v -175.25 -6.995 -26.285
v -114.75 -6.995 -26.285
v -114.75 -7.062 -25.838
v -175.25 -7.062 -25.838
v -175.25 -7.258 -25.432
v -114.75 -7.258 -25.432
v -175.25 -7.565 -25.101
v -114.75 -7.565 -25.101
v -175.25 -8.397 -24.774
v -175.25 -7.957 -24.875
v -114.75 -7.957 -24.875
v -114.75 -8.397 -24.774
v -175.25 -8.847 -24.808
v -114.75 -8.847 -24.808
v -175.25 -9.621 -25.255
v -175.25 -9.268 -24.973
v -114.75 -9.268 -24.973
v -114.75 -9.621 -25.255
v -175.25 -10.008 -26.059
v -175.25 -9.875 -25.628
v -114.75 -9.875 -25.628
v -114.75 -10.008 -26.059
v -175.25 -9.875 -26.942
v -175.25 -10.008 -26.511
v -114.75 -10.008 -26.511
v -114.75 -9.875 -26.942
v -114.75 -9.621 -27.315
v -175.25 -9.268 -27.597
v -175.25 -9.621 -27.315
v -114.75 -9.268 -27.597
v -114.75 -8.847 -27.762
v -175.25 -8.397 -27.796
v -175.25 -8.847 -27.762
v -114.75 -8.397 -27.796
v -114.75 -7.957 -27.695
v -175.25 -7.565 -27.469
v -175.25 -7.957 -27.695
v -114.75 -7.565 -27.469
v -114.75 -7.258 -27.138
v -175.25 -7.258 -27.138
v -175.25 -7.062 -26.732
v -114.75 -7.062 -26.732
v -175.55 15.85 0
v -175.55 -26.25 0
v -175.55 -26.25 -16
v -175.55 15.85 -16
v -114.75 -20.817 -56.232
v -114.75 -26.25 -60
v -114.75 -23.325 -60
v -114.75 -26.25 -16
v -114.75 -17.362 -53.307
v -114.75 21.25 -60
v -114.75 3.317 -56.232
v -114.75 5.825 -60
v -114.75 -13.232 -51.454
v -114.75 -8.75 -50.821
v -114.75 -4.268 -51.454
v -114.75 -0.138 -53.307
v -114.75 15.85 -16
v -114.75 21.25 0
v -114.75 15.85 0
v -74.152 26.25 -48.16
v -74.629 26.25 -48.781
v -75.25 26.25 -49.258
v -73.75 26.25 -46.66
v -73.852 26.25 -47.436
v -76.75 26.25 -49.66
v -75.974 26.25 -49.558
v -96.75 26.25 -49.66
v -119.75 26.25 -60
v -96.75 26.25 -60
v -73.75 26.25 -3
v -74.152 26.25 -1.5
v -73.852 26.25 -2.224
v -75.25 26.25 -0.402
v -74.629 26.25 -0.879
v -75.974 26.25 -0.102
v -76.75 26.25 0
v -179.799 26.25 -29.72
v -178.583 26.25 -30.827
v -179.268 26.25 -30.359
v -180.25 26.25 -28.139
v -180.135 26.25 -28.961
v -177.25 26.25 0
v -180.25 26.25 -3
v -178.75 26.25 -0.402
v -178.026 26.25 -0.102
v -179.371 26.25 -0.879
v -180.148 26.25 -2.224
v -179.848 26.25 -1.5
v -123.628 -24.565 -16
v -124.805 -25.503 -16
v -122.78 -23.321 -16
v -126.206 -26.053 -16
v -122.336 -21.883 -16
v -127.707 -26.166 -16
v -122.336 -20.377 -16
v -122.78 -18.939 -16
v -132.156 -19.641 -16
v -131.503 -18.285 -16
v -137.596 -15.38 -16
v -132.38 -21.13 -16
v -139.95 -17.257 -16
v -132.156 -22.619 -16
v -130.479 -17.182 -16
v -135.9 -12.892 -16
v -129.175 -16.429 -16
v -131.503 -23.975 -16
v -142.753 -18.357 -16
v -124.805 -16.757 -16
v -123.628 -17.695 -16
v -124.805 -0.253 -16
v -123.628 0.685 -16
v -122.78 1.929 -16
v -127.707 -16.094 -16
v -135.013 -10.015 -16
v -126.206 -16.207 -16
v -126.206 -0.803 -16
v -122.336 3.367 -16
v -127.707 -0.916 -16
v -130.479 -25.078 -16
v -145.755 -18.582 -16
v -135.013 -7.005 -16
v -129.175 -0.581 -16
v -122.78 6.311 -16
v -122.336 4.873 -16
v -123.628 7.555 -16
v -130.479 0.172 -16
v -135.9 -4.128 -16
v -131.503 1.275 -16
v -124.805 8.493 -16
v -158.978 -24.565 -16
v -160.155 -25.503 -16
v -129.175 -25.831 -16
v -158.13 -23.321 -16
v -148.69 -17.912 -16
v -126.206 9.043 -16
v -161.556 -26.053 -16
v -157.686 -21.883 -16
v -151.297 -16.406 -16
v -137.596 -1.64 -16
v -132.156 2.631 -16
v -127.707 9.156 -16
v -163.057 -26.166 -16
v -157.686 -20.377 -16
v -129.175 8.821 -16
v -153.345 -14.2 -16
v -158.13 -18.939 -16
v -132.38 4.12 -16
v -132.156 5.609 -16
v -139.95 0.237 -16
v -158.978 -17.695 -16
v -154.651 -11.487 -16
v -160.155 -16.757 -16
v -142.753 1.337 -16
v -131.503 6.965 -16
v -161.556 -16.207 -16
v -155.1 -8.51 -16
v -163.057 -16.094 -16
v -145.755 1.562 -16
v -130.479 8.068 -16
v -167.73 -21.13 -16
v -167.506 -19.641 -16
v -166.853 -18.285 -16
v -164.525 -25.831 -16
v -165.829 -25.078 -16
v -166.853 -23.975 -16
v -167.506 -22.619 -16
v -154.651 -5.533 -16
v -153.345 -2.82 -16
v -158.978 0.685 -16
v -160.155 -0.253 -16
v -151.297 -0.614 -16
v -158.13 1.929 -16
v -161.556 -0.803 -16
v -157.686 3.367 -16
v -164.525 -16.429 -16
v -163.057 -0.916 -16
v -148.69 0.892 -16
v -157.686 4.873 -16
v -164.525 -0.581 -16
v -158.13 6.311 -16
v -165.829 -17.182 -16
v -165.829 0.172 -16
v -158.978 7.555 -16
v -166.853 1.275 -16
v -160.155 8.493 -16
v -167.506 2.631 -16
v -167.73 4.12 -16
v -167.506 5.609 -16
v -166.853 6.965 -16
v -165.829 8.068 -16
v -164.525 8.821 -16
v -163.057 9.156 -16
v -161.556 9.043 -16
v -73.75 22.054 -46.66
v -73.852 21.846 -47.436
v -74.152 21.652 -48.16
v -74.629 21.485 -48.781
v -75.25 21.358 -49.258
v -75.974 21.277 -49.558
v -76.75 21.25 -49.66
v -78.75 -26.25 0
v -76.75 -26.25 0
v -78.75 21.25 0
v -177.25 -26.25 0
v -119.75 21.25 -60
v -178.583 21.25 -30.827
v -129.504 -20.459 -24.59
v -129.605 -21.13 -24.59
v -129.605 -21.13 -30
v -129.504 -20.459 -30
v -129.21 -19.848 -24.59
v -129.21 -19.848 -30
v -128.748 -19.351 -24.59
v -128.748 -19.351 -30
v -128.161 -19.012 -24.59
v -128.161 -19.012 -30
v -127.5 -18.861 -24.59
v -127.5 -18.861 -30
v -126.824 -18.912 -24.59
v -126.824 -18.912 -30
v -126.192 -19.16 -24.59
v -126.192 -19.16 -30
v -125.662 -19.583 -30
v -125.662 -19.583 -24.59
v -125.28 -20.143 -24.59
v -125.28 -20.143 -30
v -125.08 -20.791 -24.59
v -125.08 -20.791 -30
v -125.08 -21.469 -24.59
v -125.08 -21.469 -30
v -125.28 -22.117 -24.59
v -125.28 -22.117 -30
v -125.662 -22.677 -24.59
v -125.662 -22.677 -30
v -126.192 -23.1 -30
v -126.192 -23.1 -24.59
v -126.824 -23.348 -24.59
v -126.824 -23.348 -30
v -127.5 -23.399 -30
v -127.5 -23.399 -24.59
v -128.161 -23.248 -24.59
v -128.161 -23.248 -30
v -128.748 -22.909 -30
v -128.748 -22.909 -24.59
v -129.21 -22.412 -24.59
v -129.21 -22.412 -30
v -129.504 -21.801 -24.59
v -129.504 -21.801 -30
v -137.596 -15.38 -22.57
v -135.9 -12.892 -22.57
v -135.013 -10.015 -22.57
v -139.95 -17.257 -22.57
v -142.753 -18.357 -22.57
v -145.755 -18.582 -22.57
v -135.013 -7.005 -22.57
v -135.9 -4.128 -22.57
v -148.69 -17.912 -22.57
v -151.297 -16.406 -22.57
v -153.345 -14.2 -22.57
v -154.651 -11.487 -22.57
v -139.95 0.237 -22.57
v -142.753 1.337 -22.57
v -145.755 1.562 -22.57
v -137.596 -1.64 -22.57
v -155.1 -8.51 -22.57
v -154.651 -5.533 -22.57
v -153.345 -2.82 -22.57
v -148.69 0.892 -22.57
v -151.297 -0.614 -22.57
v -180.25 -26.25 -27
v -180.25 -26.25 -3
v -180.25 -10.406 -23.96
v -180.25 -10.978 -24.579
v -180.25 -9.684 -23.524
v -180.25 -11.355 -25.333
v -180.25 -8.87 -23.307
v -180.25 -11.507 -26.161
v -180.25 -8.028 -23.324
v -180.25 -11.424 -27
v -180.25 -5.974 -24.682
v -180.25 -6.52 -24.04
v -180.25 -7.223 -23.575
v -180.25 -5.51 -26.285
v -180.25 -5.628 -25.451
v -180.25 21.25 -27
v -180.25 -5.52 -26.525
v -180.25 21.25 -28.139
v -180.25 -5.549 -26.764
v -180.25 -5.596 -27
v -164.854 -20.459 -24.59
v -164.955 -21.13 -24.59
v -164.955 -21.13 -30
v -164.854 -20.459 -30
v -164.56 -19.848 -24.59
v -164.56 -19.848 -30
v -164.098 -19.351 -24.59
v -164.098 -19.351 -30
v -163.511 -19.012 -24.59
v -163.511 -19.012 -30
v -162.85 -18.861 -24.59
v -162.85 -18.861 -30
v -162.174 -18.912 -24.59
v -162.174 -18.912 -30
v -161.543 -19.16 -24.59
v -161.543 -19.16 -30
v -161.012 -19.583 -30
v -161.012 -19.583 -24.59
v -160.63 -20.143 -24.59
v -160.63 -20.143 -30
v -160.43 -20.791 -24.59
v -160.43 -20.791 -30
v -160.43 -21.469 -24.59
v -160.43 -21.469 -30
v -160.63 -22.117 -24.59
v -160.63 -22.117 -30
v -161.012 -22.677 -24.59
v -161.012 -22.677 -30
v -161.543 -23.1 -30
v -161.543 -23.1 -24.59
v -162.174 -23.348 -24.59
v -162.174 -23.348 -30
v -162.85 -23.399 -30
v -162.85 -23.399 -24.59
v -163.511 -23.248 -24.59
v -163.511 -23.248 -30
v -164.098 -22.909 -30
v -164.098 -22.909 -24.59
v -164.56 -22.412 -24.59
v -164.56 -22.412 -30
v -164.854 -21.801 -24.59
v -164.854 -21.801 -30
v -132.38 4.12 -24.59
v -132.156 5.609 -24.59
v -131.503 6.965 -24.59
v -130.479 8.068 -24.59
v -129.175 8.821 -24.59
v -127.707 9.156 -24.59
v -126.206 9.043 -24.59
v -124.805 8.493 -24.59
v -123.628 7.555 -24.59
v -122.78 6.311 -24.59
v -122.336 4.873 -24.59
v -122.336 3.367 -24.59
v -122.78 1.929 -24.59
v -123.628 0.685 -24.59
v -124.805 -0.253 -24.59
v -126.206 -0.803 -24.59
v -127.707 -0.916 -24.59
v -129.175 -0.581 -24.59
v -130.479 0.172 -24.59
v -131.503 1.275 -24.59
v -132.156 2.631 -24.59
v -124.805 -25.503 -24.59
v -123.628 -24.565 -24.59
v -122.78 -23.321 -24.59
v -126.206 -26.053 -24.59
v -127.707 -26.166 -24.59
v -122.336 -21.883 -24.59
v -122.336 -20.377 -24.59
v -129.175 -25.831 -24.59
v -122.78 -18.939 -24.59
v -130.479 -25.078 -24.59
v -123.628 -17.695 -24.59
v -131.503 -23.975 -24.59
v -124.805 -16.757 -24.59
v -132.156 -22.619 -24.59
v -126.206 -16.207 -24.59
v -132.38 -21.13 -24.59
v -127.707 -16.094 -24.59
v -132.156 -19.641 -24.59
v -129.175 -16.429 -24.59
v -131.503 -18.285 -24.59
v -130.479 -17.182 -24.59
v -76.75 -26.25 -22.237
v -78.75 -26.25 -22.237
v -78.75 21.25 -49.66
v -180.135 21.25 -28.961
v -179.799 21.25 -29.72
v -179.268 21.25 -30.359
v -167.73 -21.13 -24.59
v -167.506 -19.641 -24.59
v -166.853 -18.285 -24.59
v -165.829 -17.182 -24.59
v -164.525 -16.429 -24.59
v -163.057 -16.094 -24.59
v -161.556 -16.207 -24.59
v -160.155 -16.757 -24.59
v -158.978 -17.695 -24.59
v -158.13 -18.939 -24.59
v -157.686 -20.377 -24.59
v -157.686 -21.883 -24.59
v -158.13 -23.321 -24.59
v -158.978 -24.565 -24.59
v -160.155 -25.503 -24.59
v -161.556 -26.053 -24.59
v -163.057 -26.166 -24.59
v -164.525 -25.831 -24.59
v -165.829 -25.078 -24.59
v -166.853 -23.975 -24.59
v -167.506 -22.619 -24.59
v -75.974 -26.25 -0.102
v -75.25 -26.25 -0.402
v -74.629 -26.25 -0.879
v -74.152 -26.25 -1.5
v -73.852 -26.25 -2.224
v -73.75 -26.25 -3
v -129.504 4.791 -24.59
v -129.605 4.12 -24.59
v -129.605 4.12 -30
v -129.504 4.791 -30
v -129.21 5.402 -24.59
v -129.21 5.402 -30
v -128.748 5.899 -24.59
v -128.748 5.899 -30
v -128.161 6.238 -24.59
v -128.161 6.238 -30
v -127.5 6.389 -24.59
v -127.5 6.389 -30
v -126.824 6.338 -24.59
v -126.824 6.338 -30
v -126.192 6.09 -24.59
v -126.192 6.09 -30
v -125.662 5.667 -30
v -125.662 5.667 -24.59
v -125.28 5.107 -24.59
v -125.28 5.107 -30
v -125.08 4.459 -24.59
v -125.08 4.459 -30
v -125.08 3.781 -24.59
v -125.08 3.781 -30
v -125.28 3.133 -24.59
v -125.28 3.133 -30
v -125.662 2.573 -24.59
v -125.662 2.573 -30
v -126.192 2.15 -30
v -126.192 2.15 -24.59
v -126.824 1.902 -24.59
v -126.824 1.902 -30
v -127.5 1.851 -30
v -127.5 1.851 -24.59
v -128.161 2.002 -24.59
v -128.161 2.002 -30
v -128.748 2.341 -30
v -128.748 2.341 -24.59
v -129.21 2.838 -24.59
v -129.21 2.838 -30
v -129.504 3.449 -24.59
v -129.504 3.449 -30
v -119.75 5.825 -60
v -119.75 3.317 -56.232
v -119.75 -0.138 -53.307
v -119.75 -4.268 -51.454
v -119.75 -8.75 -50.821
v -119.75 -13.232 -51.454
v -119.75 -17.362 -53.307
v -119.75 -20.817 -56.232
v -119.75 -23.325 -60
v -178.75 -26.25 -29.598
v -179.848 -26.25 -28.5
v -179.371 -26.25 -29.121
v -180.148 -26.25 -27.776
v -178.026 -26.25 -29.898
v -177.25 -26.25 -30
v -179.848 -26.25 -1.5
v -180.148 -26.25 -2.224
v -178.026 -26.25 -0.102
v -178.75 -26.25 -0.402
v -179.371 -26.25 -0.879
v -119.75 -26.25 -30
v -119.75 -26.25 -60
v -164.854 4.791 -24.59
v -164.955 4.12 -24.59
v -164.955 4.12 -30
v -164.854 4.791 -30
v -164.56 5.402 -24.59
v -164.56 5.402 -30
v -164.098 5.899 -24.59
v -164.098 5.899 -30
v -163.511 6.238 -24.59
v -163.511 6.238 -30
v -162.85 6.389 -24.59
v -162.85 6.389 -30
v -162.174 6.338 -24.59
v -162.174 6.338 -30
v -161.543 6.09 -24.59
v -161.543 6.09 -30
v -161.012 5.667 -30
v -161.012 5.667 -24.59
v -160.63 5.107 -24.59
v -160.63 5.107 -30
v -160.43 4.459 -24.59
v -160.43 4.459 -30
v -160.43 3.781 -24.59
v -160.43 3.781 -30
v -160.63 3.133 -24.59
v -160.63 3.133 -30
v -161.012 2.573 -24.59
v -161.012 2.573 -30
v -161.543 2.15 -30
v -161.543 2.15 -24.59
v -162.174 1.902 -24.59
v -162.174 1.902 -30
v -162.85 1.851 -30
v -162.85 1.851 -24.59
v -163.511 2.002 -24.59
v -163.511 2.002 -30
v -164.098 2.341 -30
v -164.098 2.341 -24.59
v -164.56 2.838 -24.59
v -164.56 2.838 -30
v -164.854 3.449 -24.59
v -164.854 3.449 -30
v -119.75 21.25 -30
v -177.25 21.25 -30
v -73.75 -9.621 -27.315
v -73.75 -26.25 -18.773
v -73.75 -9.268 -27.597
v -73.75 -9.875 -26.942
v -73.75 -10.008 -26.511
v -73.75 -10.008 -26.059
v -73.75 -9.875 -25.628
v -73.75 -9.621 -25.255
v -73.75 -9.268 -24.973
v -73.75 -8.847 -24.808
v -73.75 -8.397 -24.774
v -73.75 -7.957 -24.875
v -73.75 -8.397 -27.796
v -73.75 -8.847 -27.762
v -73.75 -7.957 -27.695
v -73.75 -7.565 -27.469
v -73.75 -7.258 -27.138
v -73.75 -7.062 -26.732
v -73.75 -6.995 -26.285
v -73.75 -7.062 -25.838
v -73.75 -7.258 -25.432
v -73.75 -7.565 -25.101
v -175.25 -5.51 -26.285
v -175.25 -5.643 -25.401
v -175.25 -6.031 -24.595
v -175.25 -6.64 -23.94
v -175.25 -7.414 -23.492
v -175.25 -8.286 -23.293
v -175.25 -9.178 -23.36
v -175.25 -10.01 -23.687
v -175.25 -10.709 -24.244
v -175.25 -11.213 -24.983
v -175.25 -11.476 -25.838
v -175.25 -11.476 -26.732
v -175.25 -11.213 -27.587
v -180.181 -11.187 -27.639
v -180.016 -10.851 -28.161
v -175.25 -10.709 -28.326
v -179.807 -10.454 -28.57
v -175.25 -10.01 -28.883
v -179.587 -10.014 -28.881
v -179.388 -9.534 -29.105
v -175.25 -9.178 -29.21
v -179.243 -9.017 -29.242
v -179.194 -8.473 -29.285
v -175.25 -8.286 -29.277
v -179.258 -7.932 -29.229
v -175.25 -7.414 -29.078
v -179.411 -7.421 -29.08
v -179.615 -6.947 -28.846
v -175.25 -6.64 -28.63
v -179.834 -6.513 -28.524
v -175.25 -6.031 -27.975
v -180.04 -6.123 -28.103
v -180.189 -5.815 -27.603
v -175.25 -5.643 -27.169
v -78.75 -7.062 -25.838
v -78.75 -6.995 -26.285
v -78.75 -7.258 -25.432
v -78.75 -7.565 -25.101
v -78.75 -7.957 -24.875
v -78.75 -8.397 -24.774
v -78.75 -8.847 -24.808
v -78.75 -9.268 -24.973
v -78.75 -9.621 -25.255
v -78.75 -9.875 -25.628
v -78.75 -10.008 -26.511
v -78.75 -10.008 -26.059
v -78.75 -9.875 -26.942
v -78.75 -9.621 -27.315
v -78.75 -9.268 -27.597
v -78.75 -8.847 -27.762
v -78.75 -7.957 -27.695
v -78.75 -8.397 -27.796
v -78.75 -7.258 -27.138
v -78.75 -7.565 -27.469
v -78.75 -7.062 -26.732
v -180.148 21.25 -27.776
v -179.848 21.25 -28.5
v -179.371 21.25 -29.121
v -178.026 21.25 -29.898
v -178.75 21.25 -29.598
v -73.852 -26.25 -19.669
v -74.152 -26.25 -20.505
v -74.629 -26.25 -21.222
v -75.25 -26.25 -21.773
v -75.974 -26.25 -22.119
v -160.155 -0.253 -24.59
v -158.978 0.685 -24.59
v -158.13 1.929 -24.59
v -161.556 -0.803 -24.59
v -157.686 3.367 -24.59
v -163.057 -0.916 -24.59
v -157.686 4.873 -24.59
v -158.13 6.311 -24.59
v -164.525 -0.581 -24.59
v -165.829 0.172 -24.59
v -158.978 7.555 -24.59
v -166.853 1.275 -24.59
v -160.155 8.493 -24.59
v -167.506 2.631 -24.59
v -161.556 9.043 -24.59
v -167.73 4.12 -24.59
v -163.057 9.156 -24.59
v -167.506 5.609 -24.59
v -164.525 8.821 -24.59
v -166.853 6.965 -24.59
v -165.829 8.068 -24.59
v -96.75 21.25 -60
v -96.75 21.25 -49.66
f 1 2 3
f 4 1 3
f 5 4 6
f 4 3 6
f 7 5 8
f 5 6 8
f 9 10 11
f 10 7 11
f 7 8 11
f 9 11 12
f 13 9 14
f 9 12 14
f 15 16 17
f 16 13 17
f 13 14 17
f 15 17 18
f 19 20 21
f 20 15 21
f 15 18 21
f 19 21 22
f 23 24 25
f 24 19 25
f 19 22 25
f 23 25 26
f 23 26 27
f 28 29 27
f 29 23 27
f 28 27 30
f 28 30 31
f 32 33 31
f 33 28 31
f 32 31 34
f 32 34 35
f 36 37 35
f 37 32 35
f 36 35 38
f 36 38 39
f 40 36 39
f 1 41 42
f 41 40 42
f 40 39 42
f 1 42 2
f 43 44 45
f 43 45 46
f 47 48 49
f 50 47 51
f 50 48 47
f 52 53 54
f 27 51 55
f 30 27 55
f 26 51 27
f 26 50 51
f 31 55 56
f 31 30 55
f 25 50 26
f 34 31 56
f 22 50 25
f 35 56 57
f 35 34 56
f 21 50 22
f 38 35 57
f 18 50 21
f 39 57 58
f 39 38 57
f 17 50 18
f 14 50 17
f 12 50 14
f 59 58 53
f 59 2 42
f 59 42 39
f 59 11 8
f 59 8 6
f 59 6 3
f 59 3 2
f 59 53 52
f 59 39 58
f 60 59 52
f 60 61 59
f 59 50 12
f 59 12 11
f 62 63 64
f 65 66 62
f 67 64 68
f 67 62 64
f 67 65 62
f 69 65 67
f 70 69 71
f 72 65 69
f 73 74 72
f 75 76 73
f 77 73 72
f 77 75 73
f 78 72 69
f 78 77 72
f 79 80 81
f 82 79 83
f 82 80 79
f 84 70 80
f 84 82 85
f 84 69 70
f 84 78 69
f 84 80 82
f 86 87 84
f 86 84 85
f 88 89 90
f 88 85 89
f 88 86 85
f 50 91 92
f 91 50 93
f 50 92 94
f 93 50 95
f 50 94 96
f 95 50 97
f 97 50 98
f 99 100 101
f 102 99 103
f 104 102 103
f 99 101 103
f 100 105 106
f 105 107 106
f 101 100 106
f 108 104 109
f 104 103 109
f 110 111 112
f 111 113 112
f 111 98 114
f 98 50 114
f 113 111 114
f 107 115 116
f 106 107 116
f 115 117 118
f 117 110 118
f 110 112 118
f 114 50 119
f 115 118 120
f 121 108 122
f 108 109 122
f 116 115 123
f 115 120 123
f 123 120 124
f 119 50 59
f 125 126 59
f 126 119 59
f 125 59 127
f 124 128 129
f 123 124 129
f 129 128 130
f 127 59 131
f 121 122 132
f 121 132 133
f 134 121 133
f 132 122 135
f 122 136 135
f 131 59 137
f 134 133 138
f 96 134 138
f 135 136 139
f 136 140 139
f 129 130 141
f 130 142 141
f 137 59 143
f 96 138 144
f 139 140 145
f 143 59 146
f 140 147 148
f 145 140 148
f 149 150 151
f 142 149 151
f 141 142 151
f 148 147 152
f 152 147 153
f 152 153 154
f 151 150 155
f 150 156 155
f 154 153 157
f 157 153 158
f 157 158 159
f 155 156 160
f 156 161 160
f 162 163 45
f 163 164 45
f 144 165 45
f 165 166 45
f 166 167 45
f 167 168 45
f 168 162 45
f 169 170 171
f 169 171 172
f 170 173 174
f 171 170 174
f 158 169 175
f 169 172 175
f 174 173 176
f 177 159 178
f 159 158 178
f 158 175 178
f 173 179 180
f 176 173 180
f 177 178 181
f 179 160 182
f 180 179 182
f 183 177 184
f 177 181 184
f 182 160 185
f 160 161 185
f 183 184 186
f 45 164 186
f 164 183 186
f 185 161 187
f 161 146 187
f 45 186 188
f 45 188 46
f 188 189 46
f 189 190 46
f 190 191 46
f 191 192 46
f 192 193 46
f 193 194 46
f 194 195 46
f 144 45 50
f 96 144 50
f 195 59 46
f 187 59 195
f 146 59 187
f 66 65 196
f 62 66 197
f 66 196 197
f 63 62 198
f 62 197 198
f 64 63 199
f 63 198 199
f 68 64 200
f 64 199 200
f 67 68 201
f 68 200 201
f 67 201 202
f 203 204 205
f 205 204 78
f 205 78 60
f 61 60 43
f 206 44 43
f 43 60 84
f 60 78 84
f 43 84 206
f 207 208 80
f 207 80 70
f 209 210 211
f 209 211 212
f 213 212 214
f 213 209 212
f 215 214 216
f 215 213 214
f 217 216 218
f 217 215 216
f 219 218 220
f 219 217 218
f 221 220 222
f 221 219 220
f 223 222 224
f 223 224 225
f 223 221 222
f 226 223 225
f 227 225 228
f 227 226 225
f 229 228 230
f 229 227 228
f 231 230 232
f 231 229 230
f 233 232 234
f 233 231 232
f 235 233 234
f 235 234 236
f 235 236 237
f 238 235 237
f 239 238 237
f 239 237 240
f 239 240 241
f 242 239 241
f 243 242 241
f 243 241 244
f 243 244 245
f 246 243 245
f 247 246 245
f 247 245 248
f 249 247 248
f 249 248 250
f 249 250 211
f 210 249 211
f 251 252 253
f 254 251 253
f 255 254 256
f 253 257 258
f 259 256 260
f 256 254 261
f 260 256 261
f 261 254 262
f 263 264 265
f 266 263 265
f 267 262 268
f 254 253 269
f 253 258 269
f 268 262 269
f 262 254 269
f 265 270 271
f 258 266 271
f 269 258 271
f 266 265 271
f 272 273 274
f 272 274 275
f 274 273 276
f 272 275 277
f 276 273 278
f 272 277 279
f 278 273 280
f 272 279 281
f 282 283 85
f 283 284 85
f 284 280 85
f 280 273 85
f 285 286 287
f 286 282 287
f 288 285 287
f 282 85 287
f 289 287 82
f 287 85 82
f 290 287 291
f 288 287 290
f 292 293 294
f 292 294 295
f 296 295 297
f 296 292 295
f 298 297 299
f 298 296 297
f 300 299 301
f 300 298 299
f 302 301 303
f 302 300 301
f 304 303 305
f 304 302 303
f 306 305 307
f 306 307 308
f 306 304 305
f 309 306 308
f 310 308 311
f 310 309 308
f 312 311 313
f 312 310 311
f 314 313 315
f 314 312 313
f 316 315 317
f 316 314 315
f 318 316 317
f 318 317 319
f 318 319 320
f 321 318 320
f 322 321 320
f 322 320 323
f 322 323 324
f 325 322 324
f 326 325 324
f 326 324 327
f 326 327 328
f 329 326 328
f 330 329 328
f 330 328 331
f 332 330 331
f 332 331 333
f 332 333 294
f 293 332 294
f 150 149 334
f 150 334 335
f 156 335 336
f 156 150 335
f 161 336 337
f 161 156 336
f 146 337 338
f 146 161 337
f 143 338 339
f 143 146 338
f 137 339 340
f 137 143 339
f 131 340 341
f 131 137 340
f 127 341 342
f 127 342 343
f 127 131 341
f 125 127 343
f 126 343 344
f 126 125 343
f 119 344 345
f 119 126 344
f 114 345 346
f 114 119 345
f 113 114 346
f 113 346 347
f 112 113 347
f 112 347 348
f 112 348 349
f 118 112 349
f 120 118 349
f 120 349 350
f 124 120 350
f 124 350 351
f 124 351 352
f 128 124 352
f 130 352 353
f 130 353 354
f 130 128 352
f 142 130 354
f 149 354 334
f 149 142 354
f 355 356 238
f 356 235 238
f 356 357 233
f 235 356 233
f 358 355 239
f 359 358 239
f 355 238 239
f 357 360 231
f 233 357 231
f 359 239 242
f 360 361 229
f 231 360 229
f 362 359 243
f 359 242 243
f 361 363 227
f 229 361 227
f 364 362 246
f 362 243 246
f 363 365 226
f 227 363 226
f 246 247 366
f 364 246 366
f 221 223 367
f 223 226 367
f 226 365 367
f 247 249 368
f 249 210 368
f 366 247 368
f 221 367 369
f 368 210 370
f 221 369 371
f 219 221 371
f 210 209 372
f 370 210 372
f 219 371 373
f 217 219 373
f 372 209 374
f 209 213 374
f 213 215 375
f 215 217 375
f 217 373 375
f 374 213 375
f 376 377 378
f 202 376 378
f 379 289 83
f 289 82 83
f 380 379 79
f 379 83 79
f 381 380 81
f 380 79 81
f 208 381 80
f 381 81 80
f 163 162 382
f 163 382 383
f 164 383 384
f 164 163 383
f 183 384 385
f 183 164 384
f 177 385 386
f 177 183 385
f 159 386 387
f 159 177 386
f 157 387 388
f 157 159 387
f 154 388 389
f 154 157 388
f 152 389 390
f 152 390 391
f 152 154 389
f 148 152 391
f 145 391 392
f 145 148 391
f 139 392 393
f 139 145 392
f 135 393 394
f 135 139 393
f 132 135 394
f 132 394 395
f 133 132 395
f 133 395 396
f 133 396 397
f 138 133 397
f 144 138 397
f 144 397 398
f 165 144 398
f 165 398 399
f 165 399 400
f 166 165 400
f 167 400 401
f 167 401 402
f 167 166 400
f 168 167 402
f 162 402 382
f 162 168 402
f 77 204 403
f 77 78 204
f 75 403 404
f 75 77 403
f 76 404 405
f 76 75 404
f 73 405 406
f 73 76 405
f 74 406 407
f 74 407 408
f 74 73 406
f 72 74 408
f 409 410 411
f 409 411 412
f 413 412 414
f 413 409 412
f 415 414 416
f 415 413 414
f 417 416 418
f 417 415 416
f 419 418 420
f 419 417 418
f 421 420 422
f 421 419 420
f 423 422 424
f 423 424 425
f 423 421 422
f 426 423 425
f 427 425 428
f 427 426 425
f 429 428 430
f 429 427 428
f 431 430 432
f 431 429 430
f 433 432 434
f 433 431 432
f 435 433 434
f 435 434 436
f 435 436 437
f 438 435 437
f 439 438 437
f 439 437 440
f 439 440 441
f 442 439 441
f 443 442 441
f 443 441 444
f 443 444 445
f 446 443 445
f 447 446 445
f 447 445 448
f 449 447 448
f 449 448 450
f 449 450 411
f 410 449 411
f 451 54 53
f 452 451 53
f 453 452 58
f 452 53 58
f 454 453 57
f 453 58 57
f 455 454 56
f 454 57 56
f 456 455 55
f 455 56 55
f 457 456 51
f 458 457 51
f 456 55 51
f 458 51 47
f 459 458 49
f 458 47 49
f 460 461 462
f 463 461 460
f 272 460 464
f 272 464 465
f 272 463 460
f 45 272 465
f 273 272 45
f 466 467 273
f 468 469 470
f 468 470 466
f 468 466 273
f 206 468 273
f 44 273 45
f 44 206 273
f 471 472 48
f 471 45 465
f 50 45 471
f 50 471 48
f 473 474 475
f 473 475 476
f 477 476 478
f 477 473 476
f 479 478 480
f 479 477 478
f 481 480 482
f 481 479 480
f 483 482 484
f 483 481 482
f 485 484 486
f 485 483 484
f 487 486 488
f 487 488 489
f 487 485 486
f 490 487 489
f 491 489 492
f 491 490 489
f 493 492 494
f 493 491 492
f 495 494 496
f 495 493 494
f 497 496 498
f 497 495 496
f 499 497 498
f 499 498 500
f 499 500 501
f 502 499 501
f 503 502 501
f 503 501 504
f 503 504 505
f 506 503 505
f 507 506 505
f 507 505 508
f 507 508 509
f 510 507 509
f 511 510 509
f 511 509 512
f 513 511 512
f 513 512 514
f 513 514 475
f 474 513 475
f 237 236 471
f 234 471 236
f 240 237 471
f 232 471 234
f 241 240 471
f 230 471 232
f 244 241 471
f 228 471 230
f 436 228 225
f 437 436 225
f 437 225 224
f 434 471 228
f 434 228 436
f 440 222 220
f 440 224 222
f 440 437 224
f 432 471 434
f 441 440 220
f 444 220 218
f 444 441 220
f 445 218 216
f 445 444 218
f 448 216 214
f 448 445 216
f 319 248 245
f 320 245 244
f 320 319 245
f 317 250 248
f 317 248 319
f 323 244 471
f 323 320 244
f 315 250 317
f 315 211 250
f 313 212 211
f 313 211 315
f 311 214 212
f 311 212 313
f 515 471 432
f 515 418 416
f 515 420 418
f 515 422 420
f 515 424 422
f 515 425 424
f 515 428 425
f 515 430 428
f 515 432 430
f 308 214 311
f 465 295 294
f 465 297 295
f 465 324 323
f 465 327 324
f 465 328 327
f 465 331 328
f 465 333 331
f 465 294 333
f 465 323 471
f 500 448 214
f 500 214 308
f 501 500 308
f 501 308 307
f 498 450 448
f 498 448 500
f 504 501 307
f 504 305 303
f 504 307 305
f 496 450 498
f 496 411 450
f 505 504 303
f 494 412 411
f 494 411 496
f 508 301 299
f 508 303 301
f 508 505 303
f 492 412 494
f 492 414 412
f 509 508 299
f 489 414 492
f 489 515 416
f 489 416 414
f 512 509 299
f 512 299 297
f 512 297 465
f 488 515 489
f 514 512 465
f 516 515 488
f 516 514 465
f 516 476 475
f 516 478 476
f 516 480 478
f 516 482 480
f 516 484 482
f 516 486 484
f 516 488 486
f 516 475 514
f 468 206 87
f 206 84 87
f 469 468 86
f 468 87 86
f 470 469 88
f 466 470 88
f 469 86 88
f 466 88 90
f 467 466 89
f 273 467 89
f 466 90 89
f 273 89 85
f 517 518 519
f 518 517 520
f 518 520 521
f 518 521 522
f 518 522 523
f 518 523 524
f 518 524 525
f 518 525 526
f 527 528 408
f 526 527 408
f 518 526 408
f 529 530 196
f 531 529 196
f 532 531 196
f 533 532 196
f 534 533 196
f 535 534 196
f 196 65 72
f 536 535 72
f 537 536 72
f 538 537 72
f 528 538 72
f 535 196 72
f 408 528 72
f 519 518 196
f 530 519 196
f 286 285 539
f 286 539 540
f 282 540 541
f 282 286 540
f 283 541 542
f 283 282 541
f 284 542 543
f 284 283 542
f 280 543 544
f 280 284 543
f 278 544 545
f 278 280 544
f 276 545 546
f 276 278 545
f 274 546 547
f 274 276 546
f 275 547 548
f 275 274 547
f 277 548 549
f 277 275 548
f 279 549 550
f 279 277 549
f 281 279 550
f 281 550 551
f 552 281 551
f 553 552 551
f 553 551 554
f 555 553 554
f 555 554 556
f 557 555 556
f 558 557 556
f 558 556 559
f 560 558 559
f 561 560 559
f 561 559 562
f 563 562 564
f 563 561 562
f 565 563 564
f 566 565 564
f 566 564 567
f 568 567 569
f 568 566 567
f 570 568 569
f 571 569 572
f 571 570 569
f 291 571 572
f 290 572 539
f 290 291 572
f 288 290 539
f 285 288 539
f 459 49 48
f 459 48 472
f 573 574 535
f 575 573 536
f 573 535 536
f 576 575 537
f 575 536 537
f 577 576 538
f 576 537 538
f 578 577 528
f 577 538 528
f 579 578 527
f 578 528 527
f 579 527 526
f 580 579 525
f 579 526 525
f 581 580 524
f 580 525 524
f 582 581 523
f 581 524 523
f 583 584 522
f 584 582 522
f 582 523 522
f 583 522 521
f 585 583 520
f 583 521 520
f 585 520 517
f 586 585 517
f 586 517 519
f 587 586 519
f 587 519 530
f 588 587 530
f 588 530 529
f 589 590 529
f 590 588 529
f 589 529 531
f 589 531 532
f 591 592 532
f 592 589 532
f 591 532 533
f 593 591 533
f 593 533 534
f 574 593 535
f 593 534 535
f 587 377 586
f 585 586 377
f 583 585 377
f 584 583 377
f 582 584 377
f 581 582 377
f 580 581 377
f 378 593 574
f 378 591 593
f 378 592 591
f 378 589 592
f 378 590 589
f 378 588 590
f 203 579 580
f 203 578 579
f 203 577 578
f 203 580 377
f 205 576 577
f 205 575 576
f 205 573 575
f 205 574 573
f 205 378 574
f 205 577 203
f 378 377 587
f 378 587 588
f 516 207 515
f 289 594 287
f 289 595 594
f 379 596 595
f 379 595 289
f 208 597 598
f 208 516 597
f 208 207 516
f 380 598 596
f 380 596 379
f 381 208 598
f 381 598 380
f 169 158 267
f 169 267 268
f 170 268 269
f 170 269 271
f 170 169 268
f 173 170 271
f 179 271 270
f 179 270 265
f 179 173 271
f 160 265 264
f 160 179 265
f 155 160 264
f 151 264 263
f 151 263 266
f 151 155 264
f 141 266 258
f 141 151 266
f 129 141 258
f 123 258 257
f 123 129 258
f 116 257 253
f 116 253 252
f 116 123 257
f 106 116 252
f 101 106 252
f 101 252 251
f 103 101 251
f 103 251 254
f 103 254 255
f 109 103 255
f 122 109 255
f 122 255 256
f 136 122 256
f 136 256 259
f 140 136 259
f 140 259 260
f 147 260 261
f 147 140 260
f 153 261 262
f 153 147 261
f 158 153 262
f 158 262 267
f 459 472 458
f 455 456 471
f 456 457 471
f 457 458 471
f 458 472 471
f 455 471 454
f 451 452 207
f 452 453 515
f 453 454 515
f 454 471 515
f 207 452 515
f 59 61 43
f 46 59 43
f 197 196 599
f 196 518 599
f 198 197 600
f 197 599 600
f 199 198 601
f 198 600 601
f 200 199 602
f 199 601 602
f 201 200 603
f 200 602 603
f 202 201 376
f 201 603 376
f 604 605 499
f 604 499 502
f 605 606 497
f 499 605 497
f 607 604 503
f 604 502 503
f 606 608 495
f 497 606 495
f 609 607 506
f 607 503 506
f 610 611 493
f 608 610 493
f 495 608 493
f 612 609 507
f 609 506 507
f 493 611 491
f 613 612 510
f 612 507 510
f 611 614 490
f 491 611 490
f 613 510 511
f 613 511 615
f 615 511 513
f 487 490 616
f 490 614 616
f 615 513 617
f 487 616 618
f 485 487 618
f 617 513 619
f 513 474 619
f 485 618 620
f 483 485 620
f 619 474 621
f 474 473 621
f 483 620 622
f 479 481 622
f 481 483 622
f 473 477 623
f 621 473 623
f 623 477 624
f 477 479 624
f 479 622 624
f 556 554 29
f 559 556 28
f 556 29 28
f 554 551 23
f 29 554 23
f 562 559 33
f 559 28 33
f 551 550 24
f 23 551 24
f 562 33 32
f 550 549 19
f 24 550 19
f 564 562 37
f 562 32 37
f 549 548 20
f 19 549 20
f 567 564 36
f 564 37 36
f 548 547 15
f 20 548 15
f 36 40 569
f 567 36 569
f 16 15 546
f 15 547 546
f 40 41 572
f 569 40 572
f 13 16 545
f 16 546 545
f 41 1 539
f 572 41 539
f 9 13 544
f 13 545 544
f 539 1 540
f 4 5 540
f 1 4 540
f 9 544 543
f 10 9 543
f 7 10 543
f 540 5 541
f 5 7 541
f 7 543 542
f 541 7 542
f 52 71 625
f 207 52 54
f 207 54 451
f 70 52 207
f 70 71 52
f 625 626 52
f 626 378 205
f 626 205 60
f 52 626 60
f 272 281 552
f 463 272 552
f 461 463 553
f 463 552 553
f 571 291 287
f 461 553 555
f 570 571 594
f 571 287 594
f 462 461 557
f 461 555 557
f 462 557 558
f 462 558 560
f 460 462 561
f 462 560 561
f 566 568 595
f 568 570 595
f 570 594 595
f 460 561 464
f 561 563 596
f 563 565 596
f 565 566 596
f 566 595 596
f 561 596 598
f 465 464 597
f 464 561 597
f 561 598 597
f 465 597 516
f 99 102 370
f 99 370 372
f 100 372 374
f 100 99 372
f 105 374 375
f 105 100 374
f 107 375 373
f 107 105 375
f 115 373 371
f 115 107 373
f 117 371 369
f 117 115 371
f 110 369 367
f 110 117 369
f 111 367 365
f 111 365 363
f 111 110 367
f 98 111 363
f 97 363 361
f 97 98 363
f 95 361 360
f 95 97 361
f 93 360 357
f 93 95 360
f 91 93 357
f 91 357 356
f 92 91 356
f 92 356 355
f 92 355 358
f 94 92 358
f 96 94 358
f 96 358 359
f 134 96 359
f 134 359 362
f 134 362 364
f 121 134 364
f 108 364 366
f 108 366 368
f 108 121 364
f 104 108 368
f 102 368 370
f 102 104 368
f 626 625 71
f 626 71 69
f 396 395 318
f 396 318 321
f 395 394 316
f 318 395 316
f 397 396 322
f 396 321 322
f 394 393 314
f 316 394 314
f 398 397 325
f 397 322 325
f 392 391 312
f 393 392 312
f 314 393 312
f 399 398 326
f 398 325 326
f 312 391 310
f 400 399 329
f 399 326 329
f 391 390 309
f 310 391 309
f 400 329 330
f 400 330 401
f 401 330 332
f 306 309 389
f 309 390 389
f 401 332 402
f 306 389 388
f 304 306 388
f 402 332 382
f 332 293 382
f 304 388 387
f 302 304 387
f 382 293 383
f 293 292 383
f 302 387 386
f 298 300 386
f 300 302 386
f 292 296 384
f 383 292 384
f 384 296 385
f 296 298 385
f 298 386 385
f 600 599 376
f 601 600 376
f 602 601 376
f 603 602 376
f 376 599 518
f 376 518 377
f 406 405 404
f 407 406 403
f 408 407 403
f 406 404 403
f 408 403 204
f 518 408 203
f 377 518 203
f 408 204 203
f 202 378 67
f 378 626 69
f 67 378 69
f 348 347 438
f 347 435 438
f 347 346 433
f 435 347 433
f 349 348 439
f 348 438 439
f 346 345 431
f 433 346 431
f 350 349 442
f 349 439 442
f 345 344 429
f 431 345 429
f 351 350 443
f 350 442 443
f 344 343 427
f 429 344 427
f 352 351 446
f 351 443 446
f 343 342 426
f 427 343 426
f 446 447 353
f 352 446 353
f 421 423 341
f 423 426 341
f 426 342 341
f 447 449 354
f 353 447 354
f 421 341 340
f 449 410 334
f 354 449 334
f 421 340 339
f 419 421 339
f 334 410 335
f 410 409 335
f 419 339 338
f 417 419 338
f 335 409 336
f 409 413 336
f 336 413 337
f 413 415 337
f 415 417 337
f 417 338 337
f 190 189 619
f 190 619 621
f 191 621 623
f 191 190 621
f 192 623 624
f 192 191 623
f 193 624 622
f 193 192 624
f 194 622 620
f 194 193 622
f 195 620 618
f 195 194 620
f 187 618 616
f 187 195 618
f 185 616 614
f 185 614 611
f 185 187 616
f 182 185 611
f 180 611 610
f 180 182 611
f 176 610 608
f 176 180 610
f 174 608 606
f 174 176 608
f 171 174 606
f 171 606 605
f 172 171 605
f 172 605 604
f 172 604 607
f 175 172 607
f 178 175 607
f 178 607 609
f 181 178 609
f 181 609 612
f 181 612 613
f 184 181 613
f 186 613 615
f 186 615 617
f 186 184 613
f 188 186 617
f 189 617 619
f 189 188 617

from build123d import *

# Parameters (mm, degrees)
CROQUIS1_W              = 65.5
CROQUIS1_H              = 52.5
SALIENTE_EXTRUIR1_DEPTH = 30
CROQUIS2_W              = 60.8
CROQUIS2_H              = 42.1
CORTAR_EXTRUIR1_DEPTH   = 16
CROQUIS3_W              = 5
CROQUIS3_H              = 52.5
SALIENTE_EXTRUIR2_DEPTH = 30
CROQUIS4_W              = 60
CROQUIS4_H              = 5
SALIENTE_EXTRUIR3_DEPTH = 30
CROQUIS5_R              = 10.1
CORTAR_EXTRUIR2_DEPTH   = 6.57
CROQUIS7_R              = 5.05
CORTAR_EXTRUIR3_DEPTH   = 8.59
CROQUIS8_R              = 2.275
CORTAR_EXTRUIR4_DEPTH   = 8.59
CROQUIS9_W              = 60.5
CROQUIS9_H              = 30
SALIENTE_EXTRUIR4_DEPTH = 5
CORTAR_EXTRUIR5_DEPTH   = 5
CROQUIS11_W             = 41
CROQUIS11_H             = 60
SALIENTE_EXTRUIR5_DEPTH = 5
CROQUIS12_W             = 5
CROQUIS12_H             = 60
SALIENTE_EXTRUIR6_DEPTH = 47.5
CROQUIS13_W             = 18
CROQUIS13_H             = 10.34
CORTAR_EXTRUIR6_DEPTH   = 10
CROQUIS14_W             = 17.194416488
CROQUIS14_H             = 64.089157204
CORTAR_EXTRUIR7_DEPTH   = 10
CORTAR_EXTRUIR8_DEPTH   = 10
REDONDEO1_R             = 3
REDONDEO6_R             = 3
REDONDEO7_R             = 3
CAVIDAD1_START          = -32.75
CAVIDAD1_DEPTH          = 5
CROQUIS16_R             = 1.5
CORTAR_EXTRUIR10_DEPTH  = 10
CAVIDAD3_START          = -73.75
CAVIDAD3_OUTLINE_R      = 1.515
CAVIDAD3_DEPTH          = 106.5
CROQUIS17_R             = 3
CORTAR_EXTRUIR11_DEPTH  = 5
REDONDEO8_R             = 3
REDONDEO9_R             = 3


# Read off the part's stored shape, not the designer's step: Cavidad1, Cavidad3
with BuildPart() as part:
    # Croquis1 → Saliente-Extruir1 (new body)
    with BuildSketch(Plane.XY):
        Rectangle(CROQUIS1_W, CROQUIS1_H)
    extrude(amount=-SALIENTE_EXTRUIR1_DEPTH)

    # Croquis2 → Cortar-Extruir1 (cut)
    with BuildSketch(Plane.XY):
        with Locations((-2.35, -5.2)):
            Rectangle(CROQUIS2_W, CROQUIS2_H)
    extrude(amount=-CORTAR_EXTRUIR1_DEPTH, mode=Mode.SUBTRACT)

    # Croquis3 → Saliente-Extruir2 (add)
    with BuildSketch(Plane(origin=(0, 0, -30), x_dir=(-1, 0, 0), z_dir=(0, 0, -1))):
        with Locations((30.25, 0)):
            Rectangle(CROQUIS3_W, CROQUIS3_H)
    extrude(amount=SALIENTE_EXTRUIR2_DEPTH)

    # Croquis4 → Saliente-Extruir3 (add)
    with BuildSketch(Plane.ZY.offset(32.75)):
        with Locations((-30, 23.75)):
            Rectangle(CROQUIS4_W, CROQUIS4_H)
    extrude(amount=SALIENTE_EXTRUIR3_DEPTH)

    # Croquis5 → Cortar-Extruir2 (cut)
    with BuildSketch(Plane.XY.offset(-16)):
        with Locations((-2.5, -8.51)):
            Circle(CROQUIS5_R)
    extrude(amount=-CORTAR_EXTRUIR2_DEPTH, mode=Mode.SUBTRACT)

    # Croquis7 → Cortar-Extruir3 (cut)
    with BuildSketch(Plane.XY.offset(-16)):
        with Locations((-20.17, 4.12)):
            Circle(CROQUIS7_R)
        with Locations((15.18, 4.12)):
            Circle(CROQUIS7_R)
        with Locations((15.18, -21.13)):
            Circle(CROQUIS7_R)
        with Locations((-20.17, -21.13)):
            Circle(CROQUIS7_R)
    extrude(amount=-CORTAR_EXTRUIR3_DEPTH, mode=Mode.SUBTRACT)

    # Croquis8 → Cortar-Extruir4 (cut)
    with BuildSketch(Plane.XY.offset(-24.59)):
        with Locations((-20.17, 4.12)):
            Circle(CROQUIS8_R)
        with Locations((-20.17, -21.13)):
            Circle(CROQUIS8_R)
        with Locations((15.18, 4.12)):
            Circle(CROQUIS8_R)
        with Locations((15.18, -21.13)):
            Circle(CROQUIS8_R)
    extrude(amount=-CORTAR_EXTRUIR4_DEPTH, mode=Mode.SUBTRACT)

    # Croquis9 → Saliente-Extruir4 (add)
    with BuildSketch(Plane(origin=(0, 26.25, 0), x_dir=(1, 0, 0), z_dir=(0, 1, 0))):
        with Locations((2.5, 45)):
            Rectangle(CROQUIS9_W, CROQUIS9_H)
    extrude(amount=-SALIENTE_EXTRUIR4_DEPTH)

    # Croquis10 → Cortar-Extruir5 (cut)
    with BuildSketch(Plane.XZ.offset(-21.25)):
        Polygon((32.75, -30), (-27.75, -60), (-30.096630242, -66.962952029), (62.11742193, -82.705107475), (54.436655983, -30), align=None)
    extrude(amount=-CORTAR_EXTRUIR5_DEPTH, mode=Mode.SUBTRACT)

    # Croquis11 → Saliente-Extruir5 (add)
    with BuildSketch(Plane.XZ.offset(-21.25)):
        with Locations((-53.25, -30)):
            Rectangle(CROQUIS11_W, CROQUIS11_H)
    extrude(amount=-SALIENTE_EXTRUIR5_DEPTH)

    # Croquis12 → Saliente-Extruir6 (add)
    with BuildSketch(Plane.XZ.offset(-21.25)):
        with Locations((-71.25, -30)):
            Rectangle(CROQUIS12_W, CROQUIS12_H)
    extrude(amount=SALIENTE_EXTRUIR6_DEPTH)

    # Croquis13 → Cortar-Extruir6 (cut)
    with BuildSketch(Plane.XZ.offset(-21.25)):
        with Locations((-59.75, -54.83)):
            Rectangle(CROQUIS13_W, CROQUIS13_H)
    extrude(amount=-CORTAR_EXTRUIR6_DEPTH, mode=Mode.SUBTRACT)

    # Croquis14 → Cortar-Extruir7 (cut)
    with BuildSketch(Plane(origin=(-68.75, 0, 0), x_dir=(0, 0, -1), z_dir=(1, 0, 0))):
        with Locations((58.257208244, -5.794578602)):
            Rectangle(CROQUIS14_W, CROQUIS14_H)
    extrude(amount=-CORTAR_EXTRUIR7_DEPTH, mode=Mode.SUBTRACT)

    # Croquis15 → Cortar-Extruir8 (cut)
    with BuildSketch(Plane(origin=(-68.75, 0, 0), x_dir=(0, 0, -1), z_dir=(1, 0, 0))):
        Polygon((15.02, -38.75), (49.66, 21.25), (49.66, -38.75), align=None)
    extrude(amount=-CORTAR_EXTRUIR8_DEPTH, mode=Mode.SUBTRACT)

    # Redondeo1
    redondeo1_edges = [part.edges().sort_by_distance(p)[0] for p in [
        (32.75, 0, 0),
    ]]
    fillet(redondeo1_edges, radius=REDONDEO1_R)

    # Redondeo6
    redondeo6_edges = [part.edges().sort_by_distance(p)[0] for p in [
        (32.75, -2.5, -30),
    ]]
    fillet(redondeo6_edges, radius=REDONDEO6_R)

    # Redondeo7
    redondeo7_edges = [part.edges().sort_by_distance(p)[0] for p in [
        (32.75, 23.75, -30),
    ]]
    fillet(redondeo7_edges, radius=REDONDEO7_R)

    # Cavidad1 outline → Cavidad1 (cut)
    with BuildSketch(Plane.YZ.offset(CAVIDAD1_START)):
        with BuildLine():
            ThreePointArc((5.82457056, -60), (-8.75, -50.820508076), (-23.32457056, -60))
            Line((-23.32457056, -60), (5.82457056, -60))
        make_face()
    extrude(amount=CAVIDAD1_DEPTH, mode=Mode.SUBTRACT)

    # Croquis16 → Cortar-Extruir10 (cut)
    with BuildSketch(Plane.ZY.offset(-28.05)):
        with Locations((-26.285, -8.51)):
            Circle(CROQUIS16_R)
    extrude(amount=-CORTAR_EXTRUIR10_DEPTH, mode=Mode.SUBTRACT)

    # Cavidad3 outline → Cavidad3 (cut)
    with BuildSketch(Plane.YZ.offset(CAVIDAD3_START)):
        with Locations((-8.51, -26.285)):
            Circle(CAVIDAD3_OUTLINE_R)
    extrude(amount=CAVIDAD3_DEPTH, mode=Mode.SUBTRACT)

    # Croquis17 → Cortar-Extruir11 (cut)
    with BuildSketch(Plane(origin=(32.75, 0, 0), x_dir=(0, 0, -1), z_dir=(1, 0, 0))):
        with Locations(Location((26.285, -8.51, 0), (0, 0, 90))):
            Circle(CROQUIS17_R)
    extrude(amount=-CORTAR_EXTRUIR11_DEPTH, mode=Mode.SUBTRACT)

    # Redondeo8
    redondeo8_edges = [part.edges().sort_by_distance(p)[0] for p in [
        (-73.75, 0, 0),
    ]]
    fillet(redondeo8_edges, radius=REDONDEO8_R)

    # Redondeo9
    redondeo9_edges = [part.edges().sort_by_distance(p)[0] for p in [
        (-73.75, 23.75, -49.66),
        (-73.75, -2.5, -35.948333333),
    ]]
    fillet(redondeo9_edges, radius=REDONDEO9_R)


with BuildPart() as body_2:
    # Simetría1: mirrored copy
    add(part.part.mirror(Plane(origin=(-73.75, 26.25, 0), x_dir=(0, 0, 1), z_dir=(-1, 0, 0))))


solid = body_2.part
